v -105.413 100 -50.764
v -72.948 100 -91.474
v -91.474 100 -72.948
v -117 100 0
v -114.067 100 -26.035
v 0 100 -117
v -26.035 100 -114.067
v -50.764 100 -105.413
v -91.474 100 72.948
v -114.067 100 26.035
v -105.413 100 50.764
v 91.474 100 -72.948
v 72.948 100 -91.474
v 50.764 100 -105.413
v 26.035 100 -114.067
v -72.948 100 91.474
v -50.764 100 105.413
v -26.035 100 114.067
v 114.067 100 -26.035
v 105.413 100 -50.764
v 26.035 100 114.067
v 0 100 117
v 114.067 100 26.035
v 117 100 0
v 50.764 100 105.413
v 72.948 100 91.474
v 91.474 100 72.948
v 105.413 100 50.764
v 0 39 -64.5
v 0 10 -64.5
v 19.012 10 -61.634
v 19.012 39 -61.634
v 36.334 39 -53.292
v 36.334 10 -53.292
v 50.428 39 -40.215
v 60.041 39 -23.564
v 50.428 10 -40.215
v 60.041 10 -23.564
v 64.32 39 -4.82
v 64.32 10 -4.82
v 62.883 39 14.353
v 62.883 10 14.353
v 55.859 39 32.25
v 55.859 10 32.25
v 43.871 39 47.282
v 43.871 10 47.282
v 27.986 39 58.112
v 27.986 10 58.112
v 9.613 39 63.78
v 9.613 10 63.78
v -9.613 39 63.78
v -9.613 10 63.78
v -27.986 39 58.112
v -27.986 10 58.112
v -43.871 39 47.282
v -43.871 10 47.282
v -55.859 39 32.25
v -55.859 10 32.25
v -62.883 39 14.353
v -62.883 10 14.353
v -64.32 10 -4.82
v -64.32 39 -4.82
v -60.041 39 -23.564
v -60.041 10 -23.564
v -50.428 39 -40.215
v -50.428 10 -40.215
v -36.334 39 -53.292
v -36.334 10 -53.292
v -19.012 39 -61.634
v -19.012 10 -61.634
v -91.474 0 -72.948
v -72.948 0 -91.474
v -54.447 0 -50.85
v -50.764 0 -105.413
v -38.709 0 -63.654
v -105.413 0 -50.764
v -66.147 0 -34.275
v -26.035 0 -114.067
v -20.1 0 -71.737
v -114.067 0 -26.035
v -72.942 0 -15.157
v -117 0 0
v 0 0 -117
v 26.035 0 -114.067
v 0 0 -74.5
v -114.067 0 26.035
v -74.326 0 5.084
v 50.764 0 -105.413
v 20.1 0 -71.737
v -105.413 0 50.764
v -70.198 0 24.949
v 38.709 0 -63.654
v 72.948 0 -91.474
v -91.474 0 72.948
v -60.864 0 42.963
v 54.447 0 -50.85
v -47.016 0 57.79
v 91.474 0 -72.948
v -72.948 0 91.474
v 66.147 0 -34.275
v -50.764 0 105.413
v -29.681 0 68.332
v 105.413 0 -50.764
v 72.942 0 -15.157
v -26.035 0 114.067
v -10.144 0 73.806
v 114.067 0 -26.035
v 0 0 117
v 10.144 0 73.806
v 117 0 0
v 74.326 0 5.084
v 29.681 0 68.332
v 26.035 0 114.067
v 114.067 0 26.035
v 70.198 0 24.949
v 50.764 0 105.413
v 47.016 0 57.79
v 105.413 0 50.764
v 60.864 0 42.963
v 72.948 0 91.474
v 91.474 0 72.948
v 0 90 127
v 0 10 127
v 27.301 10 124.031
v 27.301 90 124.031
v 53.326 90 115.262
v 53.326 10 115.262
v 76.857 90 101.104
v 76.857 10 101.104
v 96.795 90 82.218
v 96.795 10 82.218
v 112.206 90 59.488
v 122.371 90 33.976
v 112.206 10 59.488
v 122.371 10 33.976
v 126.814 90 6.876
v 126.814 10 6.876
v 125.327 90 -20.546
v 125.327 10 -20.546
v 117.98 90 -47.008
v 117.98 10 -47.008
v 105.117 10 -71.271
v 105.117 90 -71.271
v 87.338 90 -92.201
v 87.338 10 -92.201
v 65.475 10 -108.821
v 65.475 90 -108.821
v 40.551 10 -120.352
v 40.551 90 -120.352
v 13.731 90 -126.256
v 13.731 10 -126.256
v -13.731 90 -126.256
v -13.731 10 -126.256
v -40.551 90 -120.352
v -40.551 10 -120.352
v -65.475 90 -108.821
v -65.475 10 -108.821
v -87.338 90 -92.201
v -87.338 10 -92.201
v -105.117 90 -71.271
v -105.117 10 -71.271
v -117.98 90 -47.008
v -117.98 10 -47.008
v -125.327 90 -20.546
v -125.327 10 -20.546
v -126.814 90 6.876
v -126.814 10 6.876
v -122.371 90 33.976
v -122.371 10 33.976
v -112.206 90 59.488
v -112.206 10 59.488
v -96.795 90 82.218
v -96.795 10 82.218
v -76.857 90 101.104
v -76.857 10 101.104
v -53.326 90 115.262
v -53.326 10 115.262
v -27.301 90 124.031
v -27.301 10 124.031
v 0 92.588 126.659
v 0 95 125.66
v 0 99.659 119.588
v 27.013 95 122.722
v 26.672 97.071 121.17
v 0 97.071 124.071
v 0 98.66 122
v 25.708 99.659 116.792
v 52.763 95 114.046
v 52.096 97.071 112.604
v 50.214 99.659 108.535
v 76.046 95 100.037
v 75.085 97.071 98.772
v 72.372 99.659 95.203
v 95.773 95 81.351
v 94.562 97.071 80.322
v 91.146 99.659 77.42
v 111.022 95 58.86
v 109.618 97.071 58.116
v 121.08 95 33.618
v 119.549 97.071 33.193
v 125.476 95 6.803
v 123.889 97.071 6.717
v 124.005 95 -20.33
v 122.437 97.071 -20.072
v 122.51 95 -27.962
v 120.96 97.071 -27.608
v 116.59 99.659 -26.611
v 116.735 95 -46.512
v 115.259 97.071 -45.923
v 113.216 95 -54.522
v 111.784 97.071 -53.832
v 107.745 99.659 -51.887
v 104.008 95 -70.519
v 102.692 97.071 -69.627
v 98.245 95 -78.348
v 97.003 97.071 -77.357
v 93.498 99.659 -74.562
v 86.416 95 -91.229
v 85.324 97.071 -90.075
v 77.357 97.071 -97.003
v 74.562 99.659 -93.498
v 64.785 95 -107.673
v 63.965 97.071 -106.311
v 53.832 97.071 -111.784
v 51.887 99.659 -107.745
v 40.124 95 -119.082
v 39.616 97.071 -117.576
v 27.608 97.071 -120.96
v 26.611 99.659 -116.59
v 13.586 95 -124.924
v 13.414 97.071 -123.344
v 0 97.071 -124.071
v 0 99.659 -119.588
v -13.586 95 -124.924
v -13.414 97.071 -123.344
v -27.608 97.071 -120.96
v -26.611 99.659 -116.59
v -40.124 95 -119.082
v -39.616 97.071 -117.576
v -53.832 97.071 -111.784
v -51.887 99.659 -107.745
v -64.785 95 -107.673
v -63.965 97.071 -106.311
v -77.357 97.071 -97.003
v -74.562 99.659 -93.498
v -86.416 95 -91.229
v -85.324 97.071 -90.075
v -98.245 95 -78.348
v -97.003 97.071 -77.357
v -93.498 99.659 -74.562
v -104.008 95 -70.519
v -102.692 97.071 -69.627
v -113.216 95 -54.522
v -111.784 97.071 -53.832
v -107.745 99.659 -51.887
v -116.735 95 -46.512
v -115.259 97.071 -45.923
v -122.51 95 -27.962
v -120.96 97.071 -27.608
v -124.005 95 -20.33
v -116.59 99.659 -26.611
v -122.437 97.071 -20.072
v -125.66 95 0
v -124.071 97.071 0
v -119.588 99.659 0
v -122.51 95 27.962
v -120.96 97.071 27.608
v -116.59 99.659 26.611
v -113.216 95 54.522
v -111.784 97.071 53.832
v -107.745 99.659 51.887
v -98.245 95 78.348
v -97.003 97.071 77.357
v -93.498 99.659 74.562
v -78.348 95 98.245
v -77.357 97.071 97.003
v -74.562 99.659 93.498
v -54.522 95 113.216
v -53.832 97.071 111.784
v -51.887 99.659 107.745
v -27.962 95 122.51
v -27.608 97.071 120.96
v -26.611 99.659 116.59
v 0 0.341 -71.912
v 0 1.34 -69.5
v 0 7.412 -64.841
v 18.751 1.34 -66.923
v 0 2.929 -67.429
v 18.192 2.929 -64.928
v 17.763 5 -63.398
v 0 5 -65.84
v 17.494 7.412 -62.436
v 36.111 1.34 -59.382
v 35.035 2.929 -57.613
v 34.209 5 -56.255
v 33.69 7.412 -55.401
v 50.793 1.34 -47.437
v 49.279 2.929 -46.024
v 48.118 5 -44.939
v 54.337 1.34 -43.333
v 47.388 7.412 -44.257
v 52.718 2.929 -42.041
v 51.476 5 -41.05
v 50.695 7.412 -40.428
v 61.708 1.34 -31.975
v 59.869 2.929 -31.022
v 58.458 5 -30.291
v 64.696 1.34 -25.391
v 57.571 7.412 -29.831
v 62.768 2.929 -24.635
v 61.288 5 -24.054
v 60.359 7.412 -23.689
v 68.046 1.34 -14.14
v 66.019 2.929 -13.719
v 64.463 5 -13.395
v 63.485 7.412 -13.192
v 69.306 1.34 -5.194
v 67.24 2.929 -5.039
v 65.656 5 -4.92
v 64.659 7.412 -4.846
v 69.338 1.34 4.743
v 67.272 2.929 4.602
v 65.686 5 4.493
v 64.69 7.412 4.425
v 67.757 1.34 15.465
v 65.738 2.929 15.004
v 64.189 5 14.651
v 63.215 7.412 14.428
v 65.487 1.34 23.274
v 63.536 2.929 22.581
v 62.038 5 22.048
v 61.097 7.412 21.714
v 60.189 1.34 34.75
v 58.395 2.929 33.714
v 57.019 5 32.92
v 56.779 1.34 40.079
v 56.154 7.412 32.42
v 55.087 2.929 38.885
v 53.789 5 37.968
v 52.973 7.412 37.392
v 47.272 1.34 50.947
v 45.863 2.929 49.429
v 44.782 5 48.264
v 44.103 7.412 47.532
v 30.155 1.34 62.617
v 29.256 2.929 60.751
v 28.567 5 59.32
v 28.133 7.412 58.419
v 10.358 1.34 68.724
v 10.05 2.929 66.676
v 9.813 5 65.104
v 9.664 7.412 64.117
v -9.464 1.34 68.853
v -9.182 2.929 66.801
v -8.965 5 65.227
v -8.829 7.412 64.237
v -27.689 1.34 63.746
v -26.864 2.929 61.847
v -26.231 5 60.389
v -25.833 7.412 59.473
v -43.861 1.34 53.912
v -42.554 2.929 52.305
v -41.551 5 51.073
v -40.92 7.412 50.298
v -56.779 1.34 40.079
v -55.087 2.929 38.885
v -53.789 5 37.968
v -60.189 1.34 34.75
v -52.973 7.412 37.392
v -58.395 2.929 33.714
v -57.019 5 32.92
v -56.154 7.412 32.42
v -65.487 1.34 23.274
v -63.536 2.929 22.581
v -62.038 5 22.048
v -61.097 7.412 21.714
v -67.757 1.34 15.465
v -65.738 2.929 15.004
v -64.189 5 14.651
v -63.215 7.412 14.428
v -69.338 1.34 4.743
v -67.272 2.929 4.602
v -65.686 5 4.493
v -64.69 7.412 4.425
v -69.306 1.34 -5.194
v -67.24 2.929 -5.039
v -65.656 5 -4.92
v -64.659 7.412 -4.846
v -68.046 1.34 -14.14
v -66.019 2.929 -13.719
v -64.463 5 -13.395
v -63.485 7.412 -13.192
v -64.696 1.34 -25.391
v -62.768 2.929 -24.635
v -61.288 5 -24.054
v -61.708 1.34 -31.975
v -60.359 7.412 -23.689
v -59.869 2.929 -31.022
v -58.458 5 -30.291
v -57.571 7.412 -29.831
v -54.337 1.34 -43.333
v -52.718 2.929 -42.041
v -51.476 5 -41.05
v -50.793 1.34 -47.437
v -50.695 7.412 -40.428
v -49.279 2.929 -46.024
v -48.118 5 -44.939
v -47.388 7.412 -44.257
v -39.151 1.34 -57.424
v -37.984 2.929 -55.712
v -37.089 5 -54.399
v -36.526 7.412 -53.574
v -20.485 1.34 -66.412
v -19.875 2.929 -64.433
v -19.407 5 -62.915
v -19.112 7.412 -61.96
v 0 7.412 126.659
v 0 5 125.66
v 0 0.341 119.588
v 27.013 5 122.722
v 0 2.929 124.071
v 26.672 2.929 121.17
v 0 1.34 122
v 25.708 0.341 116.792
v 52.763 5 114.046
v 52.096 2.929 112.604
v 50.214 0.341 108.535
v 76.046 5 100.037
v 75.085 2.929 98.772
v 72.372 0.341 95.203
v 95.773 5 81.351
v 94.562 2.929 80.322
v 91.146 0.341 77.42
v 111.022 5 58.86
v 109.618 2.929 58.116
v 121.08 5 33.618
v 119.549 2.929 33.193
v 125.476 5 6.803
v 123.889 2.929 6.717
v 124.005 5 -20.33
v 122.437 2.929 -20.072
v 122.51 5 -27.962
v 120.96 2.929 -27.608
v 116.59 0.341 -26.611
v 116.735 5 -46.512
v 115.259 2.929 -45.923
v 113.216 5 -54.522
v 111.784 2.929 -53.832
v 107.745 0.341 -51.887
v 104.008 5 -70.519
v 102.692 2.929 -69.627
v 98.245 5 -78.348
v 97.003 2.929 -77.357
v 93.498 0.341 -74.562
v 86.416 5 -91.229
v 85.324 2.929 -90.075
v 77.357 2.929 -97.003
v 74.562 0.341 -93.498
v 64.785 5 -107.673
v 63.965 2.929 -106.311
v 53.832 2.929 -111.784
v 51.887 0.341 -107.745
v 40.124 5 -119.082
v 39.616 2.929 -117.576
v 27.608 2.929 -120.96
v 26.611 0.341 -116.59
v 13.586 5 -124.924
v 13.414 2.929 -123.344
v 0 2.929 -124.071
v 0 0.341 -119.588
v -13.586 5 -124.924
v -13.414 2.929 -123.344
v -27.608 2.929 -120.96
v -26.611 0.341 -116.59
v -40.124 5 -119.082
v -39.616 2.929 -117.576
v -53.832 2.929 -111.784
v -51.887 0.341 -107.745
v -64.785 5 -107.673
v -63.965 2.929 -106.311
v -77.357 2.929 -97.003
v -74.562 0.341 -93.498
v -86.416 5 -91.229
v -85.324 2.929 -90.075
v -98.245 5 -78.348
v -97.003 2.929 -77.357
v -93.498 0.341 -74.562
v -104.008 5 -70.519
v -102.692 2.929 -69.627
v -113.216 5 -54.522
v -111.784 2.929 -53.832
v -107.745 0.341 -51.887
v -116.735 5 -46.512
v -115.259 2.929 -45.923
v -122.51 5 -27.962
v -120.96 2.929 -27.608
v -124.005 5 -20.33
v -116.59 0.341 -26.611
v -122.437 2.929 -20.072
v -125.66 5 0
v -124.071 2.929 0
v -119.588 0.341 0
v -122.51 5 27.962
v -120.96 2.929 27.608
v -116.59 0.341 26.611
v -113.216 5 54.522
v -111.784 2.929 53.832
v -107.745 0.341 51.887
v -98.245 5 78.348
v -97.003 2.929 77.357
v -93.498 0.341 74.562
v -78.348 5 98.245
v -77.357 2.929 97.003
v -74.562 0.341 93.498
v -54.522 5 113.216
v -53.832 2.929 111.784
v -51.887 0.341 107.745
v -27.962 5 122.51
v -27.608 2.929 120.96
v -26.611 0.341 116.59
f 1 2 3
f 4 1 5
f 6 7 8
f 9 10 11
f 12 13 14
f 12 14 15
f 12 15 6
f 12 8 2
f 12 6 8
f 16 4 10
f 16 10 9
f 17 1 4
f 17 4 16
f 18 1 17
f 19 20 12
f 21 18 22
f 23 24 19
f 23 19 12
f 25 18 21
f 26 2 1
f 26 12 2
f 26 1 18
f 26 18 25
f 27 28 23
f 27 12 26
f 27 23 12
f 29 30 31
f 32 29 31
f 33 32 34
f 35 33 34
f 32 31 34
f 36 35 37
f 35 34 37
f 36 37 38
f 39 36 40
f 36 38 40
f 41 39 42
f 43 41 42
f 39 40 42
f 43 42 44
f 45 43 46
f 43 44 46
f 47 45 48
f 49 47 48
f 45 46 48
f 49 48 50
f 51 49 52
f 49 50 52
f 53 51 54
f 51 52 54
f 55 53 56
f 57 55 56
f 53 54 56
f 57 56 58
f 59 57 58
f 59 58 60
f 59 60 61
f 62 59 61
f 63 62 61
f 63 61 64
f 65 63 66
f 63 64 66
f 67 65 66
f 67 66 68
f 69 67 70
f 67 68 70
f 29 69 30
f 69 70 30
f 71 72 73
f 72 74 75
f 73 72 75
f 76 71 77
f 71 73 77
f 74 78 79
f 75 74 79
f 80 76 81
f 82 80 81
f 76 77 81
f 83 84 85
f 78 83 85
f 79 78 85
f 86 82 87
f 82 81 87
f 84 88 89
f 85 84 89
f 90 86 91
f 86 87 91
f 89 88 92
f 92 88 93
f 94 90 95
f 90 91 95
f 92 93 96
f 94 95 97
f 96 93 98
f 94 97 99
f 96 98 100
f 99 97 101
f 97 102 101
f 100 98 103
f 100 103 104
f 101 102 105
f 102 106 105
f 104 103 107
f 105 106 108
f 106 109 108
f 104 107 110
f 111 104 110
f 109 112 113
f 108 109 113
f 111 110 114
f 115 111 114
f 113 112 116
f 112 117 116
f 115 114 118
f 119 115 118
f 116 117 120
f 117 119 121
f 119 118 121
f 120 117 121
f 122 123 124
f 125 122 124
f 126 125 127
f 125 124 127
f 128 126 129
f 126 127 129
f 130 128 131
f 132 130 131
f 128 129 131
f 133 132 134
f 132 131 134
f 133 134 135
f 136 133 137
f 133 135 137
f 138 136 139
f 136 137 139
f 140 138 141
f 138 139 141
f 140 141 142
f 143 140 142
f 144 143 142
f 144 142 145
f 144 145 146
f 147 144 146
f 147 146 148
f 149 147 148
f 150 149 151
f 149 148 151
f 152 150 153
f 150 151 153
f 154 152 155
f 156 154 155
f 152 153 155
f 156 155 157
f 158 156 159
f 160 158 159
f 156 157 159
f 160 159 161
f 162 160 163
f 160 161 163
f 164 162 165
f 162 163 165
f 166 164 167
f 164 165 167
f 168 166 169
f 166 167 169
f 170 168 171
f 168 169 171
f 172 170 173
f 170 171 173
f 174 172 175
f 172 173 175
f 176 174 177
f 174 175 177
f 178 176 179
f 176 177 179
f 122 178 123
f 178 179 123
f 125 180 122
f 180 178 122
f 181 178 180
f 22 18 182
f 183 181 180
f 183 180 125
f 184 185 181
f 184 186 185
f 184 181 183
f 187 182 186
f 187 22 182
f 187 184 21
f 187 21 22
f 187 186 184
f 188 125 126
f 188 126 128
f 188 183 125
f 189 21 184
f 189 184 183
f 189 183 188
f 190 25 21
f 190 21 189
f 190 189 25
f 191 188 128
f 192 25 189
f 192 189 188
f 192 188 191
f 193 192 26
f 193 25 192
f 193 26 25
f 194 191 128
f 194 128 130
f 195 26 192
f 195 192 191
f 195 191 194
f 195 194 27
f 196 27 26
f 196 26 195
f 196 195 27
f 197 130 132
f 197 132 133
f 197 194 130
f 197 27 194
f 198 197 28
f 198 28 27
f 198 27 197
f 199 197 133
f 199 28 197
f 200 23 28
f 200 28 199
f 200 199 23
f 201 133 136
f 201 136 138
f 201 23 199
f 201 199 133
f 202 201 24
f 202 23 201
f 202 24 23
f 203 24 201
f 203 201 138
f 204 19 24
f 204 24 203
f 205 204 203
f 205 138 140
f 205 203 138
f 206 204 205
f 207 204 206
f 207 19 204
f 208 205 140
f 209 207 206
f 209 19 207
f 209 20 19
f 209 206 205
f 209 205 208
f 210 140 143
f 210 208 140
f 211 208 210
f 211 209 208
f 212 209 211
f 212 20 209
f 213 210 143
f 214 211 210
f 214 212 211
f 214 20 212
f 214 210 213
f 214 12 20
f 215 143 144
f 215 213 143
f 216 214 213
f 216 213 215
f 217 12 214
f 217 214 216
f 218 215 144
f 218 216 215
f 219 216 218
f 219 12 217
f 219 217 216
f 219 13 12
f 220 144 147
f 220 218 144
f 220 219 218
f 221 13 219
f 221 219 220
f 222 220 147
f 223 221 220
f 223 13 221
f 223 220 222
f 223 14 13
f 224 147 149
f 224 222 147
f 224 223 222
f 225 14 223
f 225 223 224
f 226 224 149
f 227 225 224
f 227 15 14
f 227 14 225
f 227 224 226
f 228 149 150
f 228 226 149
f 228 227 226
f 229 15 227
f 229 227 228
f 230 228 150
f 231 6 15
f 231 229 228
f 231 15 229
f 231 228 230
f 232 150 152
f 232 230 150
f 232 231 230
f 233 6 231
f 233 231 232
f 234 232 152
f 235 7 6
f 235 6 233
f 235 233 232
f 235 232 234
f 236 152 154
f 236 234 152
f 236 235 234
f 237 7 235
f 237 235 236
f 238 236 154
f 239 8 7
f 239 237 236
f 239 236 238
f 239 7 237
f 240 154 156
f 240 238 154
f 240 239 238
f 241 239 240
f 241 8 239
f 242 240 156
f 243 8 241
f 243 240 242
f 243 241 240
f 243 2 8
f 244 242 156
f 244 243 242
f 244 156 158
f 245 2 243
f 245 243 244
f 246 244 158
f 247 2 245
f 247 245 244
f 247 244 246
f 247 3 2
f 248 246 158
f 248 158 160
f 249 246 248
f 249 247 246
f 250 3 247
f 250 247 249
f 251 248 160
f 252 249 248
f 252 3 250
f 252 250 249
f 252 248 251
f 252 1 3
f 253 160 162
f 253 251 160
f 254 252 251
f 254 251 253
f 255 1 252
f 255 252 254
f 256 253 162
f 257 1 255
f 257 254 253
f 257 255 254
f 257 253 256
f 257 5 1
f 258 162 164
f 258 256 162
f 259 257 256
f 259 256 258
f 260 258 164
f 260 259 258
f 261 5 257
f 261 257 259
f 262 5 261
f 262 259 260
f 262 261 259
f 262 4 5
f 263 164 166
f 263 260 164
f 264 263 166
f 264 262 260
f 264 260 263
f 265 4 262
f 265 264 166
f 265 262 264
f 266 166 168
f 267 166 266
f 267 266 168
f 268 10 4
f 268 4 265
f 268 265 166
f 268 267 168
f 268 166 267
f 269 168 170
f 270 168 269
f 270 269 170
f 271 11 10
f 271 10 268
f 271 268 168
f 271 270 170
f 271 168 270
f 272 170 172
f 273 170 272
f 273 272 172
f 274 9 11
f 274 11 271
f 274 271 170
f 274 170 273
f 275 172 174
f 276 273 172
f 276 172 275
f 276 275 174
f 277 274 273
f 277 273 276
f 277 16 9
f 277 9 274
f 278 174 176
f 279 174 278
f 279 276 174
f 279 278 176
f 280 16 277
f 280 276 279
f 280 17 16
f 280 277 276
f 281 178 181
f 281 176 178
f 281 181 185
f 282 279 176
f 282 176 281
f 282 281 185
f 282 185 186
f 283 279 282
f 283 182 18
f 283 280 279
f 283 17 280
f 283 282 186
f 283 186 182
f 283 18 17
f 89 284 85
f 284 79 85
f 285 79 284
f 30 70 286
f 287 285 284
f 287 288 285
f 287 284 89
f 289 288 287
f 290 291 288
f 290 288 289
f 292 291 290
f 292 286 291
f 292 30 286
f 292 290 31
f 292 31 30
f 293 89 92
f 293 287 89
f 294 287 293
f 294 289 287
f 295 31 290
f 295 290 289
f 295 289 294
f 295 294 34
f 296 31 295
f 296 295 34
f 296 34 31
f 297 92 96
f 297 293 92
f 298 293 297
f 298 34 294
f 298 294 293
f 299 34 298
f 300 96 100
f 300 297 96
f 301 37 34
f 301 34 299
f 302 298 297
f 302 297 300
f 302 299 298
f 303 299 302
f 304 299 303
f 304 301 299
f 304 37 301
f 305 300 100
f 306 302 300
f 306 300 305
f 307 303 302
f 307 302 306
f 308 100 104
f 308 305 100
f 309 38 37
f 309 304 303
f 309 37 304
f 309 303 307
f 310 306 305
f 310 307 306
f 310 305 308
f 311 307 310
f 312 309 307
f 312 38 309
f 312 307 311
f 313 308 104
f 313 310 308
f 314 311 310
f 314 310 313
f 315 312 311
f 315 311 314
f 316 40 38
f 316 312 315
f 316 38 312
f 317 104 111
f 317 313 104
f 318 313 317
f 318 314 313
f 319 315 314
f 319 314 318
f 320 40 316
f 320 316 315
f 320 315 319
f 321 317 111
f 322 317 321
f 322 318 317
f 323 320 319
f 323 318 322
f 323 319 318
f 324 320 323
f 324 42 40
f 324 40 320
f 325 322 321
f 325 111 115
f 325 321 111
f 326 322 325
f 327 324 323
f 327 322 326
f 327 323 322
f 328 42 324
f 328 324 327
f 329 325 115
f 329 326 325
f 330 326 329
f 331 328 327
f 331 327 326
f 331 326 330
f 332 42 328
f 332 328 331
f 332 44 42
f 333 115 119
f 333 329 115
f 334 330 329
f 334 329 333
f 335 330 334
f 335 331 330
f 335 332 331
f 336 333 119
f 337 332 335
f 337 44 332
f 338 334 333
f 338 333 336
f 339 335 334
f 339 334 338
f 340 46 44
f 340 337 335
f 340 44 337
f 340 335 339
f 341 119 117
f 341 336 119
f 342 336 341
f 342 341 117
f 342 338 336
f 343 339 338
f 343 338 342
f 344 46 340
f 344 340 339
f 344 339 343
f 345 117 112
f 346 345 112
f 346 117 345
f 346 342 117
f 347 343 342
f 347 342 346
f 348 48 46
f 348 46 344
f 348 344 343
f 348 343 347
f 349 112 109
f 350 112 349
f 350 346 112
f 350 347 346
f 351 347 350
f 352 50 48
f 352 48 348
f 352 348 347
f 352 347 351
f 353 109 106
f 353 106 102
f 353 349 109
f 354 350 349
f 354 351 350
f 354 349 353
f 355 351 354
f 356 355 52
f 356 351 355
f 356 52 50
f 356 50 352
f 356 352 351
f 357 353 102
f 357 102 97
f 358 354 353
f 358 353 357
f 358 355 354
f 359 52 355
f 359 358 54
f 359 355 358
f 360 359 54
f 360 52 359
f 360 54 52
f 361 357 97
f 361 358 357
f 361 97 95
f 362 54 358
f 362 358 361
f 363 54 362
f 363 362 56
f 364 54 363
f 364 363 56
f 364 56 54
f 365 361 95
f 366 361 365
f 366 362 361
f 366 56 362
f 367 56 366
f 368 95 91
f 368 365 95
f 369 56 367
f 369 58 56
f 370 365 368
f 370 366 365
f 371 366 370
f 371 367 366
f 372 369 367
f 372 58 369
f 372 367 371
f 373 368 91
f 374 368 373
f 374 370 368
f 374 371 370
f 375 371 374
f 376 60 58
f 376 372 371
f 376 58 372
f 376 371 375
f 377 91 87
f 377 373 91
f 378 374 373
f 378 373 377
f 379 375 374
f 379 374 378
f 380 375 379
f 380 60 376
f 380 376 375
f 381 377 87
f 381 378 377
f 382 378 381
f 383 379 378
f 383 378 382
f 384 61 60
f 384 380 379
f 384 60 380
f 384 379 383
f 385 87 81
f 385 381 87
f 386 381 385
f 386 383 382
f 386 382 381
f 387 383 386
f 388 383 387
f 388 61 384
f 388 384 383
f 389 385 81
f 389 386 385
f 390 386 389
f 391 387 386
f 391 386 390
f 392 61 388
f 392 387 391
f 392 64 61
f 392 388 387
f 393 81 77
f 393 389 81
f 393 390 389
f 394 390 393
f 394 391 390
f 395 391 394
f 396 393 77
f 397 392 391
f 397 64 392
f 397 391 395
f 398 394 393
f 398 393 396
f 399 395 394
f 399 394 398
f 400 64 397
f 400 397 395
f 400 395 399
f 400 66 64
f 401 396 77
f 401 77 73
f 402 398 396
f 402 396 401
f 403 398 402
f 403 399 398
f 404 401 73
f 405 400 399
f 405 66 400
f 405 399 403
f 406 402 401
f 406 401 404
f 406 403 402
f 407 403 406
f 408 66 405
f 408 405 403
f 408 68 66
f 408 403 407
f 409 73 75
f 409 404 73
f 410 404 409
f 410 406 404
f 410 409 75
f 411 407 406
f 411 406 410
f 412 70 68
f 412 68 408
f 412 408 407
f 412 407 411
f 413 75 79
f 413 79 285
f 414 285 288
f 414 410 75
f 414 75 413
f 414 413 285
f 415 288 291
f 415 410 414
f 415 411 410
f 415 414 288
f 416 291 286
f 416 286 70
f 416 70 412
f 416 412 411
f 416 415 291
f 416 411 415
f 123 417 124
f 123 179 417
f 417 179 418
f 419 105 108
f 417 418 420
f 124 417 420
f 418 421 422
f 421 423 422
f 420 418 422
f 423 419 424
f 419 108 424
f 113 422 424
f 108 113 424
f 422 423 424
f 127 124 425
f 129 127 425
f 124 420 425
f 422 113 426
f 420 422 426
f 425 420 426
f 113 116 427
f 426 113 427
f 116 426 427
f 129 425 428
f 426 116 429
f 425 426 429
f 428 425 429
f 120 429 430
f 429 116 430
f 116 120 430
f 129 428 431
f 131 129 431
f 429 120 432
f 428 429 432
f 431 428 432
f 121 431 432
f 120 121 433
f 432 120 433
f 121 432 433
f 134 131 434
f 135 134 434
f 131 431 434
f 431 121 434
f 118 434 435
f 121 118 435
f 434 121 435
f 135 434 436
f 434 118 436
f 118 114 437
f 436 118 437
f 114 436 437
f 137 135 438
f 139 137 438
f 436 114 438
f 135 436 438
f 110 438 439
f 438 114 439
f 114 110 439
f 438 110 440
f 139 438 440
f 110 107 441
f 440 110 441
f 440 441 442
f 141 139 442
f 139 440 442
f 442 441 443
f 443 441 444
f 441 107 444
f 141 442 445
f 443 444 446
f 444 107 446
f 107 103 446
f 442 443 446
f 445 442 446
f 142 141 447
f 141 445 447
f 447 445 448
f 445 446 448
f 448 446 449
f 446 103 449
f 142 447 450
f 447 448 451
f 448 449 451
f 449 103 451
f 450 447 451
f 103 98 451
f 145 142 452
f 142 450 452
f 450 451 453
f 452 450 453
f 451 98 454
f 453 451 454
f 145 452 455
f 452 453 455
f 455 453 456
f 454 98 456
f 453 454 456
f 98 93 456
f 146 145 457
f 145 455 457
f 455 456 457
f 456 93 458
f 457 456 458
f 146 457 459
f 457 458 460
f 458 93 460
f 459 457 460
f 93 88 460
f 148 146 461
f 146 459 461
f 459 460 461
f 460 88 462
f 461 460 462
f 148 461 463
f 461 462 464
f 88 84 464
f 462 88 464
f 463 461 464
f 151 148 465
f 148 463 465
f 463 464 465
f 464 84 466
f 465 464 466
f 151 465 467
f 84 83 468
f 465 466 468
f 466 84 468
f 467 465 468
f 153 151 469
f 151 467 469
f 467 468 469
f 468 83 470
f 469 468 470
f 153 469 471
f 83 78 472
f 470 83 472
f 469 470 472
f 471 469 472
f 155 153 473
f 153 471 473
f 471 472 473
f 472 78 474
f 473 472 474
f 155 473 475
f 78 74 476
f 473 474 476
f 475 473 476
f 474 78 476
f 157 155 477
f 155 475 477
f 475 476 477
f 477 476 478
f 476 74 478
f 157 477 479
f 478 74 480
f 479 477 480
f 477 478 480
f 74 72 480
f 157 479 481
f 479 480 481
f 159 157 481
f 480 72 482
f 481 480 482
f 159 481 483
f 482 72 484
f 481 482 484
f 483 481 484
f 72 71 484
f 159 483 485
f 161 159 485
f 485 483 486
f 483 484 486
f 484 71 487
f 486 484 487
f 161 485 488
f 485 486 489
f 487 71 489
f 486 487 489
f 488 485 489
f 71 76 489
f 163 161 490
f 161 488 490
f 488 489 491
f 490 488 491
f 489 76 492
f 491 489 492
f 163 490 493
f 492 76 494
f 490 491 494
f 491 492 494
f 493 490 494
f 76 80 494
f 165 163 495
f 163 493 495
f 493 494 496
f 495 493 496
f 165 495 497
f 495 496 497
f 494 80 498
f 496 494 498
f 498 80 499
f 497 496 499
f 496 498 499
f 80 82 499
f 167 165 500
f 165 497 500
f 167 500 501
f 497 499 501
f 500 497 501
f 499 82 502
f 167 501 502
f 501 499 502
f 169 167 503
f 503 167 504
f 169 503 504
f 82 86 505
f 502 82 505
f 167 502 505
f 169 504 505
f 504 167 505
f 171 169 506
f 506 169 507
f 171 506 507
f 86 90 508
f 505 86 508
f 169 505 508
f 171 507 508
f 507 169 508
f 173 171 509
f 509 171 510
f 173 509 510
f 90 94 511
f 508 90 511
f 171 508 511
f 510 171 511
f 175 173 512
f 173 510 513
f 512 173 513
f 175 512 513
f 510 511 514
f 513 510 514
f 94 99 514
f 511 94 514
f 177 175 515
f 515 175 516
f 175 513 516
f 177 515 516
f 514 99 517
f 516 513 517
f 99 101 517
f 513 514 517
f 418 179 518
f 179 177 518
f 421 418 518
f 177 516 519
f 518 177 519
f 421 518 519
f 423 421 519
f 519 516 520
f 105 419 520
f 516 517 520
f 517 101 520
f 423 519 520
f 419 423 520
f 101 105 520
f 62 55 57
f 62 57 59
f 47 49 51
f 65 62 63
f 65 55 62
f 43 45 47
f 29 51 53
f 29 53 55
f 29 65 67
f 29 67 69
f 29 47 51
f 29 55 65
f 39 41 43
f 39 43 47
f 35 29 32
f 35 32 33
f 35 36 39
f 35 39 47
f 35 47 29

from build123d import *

# Parameters (mm, degrees)
SKETCH_1_R          = 127
EXTRUDE_1_DEPTH     = 100
FILLET_1_R          = 10
SKETCH_2_R          = 64.5
CUT_EXTRUDE_1_DEPTH = 39
FILLET_2_R          = 10


with BuildPart() as part:
    # 草图1 → 凸台-拉伸1 (new body)
    with BuildSketch(Plane(origin=(0, 0, 0), x_dir=(1, 0, 0), z_dir=(0, 1, 0))):
        with Locations(Location((0, 0, 0), (0, 0, 270))):
            Circle(SKETCH_1_R)
    extrude(amount=EXTRUDE_1_DEPTH)

    # 圆角1
    fillet_1_edges = [part.edges().sort_by_distance(p)[0] for p in [
        (0, 0, -127),
        (0, 100, -127),
    ]]
    fillet(fillet_1_edges, radius=FILLET_1_R)

    # 草图2 → 切除-拉伸1 (cut)
    with BuildSketch(Plane.XZ):
        with Locations(Location((0, 0, 0), (0, 0, 270))):
            Circle(SKETCH_2_R)
    extrude(amount=-CUT_EXTRUDE_1_DEPTH, mode=Mode.SUBTRACT)

    # 圆角2
    fillet_2_edges = [part.edges().sort_by_distance(p)[0] for p in [
        (0, 0, 64.5),
    ]]
    fillet(fillet_2_edges, radius=FILLET_2_R)


solid = part.part
